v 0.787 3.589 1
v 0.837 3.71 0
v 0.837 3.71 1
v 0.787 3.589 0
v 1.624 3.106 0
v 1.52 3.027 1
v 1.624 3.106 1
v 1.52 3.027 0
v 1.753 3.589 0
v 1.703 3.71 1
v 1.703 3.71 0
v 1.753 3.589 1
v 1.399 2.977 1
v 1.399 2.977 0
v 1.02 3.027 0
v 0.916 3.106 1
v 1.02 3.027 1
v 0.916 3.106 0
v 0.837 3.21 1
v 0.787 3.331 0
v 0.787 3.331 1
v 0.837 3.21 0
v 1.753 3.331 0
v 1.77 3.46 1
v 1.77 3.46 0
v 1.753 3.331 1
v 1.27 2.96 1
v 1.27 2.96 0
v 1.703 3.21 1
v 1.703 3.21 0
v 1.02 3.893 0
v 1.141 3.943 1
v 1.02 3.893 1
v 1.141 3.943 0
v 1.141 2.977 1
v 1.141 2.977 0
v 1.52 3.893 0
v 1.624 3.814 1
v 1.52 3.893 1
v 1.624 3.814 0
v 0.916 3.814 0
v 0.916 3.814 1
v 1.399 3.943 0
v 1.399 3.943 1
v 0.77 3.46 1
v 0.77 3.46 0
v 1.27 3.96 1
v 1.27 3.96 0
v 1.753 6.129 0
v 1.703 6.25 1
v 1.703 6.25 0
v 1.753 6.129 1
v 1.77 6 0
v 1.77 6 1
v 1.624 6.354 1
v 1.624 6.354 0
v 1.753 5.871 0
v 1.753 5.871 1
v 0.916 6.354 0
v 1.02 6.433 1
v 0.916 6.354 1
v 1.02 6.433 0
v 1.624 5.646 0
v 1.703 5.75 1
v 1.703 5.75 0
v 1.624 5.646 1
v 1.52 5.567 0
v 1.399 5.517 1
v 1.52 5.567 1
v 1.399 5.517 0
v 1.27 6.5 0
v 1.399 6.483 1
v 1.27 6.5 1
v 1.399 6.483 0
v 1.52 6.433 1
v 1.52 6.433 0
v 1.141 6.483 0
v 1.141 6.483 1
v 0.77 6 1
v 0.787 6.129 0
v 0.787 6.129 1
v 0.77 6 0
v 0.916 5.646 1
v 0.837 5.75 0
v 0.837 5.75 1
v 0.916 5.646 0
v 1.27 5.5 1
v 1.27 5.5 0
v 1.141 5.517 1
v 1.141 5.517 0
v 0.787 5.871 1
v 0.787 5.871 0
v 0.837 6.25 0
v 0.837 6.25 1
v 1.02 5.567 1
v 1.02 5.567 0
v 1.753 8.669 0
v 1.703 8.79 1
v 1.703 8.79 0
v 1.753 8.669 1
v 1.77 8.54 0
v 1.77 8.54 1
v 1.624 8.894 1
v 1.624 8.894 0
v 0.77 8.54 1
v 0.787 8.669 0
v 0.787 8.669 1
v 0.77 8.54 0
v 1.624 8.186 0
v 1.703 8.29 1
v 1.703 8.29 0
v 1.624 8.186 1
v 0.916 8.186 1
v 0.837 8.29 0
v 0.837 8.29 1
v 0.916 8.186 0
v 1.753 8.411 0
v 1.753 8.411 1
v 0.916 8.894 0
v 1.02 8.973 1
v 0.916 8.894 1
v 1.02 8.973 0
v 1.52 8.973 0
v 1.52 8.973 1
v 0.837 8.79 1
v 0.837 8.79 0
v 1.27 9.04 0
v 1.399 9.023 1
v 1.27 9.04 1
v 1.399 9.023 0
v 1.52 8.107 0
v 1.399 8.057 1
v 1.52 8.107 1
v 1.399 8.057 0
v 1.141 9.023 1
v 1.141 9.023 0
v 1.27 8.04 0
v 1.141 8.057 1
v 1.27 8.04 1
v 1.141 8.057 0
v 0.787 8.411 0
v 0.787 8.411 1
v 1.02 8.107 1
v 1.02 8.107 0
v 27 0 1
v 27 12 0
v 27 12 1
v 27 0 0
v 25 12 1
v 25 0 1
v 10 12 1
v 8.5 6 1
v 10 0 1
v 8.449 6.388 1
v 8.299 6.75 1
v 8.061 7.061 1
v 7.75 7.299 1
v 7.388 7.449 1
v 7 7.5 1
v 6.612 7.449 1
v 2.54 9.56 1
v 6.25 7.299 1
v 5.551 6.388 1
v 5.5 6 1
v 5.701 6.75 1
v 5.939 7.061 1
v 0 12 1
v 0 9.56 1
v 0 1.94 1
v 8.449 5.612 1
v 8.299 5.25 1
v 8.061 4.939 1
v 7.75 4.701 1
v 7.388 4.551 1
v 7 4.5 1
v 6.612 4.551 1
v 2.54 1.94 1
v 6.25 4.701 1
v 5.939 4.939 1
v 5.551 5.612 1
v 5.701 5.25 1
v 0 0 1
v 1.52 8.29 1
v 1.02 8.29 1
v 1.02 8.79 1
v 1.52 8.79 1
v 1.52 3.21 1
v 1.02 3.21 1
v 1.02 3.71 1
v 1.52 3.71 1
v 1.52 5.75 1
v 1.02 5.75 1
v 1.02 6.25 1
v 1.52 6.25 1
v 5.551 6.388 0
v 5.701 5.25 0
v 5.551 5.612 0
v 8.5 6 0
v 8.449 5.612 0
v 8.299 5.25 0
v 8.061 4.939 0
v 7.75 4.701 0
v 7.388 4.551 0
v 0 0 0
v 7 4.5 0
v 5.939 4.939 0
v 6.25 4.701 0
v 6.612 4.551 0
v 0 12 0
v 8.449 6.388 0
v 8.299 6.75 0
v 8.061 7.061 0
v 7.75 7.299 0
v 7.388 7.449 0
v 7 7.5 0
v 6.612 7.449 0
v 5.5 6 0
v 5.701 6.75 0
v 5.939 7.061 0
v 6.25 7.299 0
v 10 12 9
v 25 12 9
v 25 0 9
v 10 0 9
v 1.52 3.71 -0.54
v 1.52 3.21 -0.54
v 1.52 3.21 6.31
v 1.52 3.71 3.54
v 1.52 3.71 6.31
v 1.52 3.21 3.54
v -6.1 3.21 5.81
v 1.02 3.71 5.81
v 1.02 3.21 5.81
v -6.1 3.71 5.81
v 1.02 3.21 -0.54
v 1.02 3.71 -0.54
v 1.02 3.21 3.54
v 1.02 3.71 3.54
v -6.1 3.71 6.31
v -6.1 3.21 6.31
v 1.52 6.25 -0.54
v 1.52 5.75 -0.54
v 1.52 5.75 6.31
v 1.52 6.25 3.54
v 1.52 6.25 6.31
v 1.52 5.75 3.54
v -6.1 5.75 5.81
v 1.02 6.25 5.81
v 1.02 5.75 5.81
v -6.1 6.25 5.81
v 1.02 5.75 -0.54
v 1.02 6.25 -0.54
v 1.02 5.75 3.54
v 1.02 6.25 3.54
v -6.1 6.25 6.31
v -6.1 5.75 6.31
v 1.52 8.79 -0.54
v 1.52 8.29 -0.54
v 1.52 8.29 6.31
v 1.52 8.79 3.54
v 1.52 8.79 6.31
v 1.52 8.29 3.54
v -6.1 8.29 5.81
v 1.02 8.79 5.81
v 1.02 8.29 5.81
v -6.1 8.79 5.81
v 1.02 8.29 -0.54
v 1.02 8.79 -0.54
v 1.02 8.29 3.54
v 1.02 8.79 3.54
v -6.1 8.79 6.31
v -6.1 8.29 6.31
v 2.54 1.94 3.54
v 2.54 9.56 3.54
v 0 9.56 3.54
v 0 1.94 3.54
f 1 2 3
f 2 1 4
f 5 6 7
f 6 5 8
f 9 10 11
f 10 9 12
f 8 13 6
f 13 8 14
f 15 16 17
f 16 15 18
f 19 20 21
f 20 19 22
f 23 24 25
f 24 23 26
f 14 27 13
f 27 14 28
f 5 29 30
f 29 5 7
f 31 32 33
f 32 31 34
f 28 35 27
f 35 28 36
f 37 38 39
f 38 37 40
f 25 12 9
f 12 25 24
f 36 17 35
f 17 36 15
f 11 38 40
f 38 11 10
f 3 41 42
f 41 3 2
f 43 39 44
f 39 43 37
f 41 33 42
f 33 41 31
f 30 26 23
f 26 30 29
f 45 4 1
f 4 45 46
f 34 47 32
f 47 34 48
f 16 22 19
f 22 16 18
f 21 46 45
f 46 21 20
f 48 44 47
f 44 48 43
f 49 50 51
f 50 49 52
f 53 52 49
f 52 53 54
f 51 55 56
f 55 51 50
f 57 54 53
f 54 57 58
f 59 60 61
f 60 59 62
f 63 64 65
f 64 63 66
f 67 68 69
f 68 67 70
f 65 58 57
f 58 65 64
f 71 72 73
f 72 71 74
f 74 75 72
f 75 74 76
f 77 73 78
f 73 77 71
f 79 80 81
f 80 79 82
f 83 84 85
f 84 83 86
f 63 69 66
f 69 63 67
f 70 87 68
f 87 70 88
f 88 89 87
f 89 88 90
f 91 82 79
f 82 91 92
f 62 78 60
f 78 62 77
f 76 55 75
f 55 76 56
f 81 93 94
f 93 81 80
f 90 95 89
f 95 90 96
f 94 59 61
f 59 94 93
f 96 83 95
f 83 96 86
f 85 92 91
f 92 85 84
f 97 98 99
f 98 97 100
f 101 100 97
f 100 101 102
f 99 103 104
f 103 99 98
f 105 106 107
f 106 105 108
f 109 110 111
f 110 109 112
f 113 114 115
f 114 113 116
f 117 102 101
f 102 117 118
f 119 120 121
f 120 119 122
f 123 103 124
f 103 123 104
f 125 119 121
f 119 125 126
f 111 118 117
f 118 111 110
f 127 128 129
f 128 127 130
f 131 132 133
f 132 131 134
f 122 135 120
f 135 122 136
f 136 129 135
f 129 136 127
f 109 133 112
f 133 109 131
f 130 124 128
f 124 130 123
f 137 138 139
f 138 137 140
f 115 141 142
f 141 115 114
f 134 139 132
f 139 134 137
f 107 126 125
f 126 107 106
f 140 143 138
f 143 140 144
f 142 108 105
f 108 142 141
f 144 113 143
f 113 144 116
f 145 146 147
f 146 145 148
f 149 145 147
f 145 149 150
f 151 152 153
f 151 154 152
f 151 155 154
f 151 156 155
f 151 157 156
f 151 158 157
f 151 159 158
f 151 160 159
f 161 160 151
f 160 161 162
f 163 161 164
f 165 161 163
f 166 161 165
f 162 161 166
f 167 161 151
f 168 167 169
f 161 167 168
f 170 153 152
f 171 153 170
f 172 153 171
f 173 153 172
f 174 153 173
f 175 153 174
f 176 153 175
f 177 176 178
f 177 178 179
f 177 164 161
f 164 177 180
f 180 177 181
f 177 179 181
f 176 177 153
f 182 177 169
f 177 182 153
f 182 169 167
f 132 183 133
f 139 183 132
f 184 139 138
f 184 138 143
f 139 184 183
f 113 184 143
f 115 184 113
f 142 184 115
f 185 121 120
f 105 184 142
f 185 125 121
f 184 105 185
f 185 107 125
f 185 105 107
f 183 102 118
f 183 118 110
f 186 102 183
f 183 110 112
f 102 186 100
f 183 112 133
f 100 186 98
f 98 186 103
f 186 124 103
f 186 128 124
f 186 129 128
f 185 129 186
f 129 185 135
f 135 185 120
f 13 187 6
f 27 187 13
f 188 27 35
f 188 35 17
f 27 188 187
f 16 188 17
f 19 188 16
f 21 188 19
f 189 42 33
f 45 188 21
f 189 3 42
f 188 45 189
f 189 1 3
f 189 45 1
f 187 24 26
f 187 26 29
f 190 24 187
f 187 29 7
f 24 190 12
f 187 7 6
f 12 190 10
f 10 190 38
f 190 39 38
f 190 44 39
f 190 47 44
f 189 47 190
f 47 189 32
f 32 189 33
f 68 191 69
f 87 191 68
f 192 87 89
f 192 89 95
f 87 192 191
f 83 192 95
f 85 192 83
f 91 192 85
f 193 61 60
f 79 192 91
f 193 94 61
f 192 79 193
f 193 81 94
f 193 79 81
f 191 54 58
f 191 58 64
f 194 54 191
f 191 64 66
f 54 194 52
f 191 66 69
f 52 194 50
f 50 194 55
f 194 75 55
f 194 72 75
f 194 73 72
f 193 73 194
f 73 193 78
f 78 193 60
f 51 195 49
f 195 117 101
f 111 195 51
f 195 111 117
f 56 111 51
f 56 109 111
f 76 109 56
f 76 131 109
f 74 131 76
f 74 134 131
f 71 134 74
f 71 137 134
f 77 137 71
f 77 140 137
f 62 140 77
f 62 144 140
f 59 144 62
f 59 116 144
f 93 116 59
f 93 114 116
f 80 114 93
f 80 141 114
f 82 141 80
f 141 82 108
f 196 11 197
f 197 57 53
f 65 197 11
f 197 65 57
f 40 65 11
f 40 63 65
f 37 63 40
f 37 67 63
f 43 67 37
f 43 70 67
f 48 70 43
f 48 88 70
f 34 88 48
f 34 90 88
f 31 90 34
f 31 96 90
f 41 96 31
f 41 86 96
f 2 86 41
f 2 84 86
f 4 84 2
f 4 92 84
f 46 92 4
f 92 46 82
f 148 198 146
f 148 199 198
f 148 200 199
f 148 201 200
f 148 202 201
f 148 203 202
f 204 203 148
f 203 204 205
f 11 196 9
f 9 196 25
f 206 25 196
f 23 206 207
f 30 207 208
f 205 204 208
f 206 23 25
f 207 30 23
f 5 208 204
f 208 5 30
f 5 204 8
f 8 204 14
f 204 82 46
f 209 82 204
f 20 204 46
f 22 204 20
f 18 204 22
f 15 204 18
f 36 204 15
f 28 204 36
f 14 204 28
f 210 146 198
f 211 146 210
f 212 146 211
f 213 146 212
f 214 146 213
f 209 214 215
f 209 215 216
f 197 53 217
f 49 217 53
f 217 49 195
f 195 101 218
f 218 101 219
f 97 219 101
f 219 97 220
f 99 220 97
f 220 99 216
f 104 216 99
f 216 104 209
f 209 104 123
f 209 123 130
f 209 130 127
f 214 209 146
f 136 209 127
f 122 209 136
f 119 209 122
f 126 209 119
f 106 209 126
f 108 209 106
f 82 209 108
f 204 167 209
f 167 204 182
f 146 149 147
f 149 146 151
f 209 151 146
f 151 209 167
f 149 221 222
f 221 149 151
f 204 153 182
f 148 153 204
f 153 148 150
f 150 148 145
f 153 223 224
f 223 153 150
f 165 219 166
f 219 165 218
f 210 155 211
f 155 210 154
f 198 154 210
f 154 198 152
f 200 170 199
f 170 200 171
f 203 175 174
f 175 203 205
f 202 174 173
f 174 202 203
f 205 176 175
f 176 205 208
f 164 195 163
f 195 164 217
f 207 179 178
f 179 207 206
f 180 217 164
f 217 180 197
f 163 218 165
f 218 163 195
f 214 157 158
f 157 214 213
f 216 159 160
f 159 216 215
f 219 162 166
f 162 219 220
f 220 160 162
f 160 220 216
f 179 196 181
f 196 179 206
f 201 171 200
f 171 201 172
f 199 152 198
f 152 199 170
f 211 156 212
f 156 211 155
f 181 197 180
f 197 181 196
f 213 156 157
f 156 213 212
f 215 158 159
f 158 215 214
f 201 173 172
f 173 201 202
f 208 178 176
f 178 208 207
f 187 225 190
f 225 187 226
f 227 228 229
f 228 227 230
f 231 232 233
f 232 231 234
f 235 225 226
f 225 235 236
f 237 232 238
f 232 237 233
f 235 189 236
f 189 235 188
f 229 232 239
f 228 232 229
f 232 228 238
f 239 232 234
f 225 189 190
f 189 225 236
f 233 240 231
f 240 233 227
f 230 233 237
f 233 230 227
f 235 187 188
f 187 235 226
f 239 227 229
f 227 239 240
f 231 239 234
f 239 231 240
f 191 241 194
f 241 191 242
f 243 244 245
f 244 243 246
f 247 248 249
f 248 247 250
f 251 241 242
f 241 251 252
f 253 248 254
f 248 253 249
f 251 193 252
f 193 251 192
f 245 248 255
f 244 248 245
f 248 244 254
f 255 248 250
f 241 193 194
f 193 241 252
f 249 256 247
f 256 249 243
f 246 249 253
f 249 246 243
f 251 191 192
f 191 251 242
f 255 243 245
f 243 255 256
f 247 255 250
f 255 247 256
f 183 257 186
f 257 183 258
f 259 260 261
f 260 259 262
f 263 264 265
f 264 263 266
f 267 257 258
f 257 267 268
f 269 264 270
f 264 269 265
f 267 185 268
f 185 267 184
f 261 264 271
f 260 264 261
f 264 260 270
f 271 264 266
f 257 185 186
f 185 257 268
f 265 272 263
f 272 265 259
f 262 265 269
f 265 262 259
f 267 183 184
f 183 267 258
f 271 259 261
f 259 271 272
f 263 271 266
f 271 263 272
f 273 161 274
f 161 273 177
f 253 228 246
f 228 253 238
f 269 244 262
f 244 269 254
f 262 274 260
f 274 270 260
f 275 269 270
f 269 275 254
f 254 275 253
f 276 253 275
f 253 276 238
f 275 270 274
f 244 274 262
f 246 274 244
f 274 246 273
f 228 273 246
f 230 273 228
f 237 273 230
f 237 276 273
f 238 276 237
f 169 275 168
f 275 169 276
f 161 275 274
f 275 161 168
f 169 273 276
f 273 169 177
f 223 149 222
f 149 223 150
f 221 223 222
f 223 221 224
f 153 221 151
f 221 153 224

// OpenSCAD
// file: Connectors.scad
// some connectors

module female_connectors_90(d=2.54,w=0.5,n=4){
    x=3*d;
    y=2.5*d;
    union() {
        color("DarkGray") 
        translate([-d,0,d/2])
        cube([d, n*d, d], center=true);
        color("White") 
        for (xl = [0: d : (n-1)*d]) {
            translate([-d-w/2, xl-(n-1)*d/2, 1-d]) {
            cube([w, w, y]);
            translate([-x+w,0,y]) cube([x, w, w]);}
        }
    }
}
// main file
// the KY-015 DHT11 sensor
pcb_KY015 = [27, 12, 1];

use <Connectors.scad>

module dht11_sensor_connectors(def=pcb_KY015,d=2.54,w=0.5) {
    // the connector
    left=[d+d/2+w/2,def[1]/2,0];
    translate(left+[-w/2,-w/2,-w+1.5])
    female_connectors_90(n=3);
}

module dht11_sensor_holes(def=pcb_KY015,d=2.54,w=0.5,n=3) {
    left=[d+d/2+w/2,def[1]/2,0];
    translate(left)
    for (xl = [0: d : (n-1)*d]) {
        translate([-d-w/2, xl-(n-1)*d/2, -d])
        cylinder(h=2*d, r=w, $fn=24);
    }
}

module dht11_sensor_cube(cube=[16, 12, 8]) {
    cube(cube);
}

module dht11_sensor(def=pcb_KY015) {
    color("DarkGray")
    // the board
    difference() {
    cube(def);
    translate([7, def[1]/2, -1.5]) 
        cylinder(d=3,h=3, $fn=24);
    dht11_sensor_holes(def=def);
    }
    dht11_sensor_connectors(def=def);
    // the sensor
    sensor=[15, 12, 8];
    color("SteelBlue")
    translate([def[0]-sensor[0]-2, (def[1]-sensor[1])/2, def[2]])
    dht11_sensor_cube(cube=sensor);
}

dht11_sensor();
        
